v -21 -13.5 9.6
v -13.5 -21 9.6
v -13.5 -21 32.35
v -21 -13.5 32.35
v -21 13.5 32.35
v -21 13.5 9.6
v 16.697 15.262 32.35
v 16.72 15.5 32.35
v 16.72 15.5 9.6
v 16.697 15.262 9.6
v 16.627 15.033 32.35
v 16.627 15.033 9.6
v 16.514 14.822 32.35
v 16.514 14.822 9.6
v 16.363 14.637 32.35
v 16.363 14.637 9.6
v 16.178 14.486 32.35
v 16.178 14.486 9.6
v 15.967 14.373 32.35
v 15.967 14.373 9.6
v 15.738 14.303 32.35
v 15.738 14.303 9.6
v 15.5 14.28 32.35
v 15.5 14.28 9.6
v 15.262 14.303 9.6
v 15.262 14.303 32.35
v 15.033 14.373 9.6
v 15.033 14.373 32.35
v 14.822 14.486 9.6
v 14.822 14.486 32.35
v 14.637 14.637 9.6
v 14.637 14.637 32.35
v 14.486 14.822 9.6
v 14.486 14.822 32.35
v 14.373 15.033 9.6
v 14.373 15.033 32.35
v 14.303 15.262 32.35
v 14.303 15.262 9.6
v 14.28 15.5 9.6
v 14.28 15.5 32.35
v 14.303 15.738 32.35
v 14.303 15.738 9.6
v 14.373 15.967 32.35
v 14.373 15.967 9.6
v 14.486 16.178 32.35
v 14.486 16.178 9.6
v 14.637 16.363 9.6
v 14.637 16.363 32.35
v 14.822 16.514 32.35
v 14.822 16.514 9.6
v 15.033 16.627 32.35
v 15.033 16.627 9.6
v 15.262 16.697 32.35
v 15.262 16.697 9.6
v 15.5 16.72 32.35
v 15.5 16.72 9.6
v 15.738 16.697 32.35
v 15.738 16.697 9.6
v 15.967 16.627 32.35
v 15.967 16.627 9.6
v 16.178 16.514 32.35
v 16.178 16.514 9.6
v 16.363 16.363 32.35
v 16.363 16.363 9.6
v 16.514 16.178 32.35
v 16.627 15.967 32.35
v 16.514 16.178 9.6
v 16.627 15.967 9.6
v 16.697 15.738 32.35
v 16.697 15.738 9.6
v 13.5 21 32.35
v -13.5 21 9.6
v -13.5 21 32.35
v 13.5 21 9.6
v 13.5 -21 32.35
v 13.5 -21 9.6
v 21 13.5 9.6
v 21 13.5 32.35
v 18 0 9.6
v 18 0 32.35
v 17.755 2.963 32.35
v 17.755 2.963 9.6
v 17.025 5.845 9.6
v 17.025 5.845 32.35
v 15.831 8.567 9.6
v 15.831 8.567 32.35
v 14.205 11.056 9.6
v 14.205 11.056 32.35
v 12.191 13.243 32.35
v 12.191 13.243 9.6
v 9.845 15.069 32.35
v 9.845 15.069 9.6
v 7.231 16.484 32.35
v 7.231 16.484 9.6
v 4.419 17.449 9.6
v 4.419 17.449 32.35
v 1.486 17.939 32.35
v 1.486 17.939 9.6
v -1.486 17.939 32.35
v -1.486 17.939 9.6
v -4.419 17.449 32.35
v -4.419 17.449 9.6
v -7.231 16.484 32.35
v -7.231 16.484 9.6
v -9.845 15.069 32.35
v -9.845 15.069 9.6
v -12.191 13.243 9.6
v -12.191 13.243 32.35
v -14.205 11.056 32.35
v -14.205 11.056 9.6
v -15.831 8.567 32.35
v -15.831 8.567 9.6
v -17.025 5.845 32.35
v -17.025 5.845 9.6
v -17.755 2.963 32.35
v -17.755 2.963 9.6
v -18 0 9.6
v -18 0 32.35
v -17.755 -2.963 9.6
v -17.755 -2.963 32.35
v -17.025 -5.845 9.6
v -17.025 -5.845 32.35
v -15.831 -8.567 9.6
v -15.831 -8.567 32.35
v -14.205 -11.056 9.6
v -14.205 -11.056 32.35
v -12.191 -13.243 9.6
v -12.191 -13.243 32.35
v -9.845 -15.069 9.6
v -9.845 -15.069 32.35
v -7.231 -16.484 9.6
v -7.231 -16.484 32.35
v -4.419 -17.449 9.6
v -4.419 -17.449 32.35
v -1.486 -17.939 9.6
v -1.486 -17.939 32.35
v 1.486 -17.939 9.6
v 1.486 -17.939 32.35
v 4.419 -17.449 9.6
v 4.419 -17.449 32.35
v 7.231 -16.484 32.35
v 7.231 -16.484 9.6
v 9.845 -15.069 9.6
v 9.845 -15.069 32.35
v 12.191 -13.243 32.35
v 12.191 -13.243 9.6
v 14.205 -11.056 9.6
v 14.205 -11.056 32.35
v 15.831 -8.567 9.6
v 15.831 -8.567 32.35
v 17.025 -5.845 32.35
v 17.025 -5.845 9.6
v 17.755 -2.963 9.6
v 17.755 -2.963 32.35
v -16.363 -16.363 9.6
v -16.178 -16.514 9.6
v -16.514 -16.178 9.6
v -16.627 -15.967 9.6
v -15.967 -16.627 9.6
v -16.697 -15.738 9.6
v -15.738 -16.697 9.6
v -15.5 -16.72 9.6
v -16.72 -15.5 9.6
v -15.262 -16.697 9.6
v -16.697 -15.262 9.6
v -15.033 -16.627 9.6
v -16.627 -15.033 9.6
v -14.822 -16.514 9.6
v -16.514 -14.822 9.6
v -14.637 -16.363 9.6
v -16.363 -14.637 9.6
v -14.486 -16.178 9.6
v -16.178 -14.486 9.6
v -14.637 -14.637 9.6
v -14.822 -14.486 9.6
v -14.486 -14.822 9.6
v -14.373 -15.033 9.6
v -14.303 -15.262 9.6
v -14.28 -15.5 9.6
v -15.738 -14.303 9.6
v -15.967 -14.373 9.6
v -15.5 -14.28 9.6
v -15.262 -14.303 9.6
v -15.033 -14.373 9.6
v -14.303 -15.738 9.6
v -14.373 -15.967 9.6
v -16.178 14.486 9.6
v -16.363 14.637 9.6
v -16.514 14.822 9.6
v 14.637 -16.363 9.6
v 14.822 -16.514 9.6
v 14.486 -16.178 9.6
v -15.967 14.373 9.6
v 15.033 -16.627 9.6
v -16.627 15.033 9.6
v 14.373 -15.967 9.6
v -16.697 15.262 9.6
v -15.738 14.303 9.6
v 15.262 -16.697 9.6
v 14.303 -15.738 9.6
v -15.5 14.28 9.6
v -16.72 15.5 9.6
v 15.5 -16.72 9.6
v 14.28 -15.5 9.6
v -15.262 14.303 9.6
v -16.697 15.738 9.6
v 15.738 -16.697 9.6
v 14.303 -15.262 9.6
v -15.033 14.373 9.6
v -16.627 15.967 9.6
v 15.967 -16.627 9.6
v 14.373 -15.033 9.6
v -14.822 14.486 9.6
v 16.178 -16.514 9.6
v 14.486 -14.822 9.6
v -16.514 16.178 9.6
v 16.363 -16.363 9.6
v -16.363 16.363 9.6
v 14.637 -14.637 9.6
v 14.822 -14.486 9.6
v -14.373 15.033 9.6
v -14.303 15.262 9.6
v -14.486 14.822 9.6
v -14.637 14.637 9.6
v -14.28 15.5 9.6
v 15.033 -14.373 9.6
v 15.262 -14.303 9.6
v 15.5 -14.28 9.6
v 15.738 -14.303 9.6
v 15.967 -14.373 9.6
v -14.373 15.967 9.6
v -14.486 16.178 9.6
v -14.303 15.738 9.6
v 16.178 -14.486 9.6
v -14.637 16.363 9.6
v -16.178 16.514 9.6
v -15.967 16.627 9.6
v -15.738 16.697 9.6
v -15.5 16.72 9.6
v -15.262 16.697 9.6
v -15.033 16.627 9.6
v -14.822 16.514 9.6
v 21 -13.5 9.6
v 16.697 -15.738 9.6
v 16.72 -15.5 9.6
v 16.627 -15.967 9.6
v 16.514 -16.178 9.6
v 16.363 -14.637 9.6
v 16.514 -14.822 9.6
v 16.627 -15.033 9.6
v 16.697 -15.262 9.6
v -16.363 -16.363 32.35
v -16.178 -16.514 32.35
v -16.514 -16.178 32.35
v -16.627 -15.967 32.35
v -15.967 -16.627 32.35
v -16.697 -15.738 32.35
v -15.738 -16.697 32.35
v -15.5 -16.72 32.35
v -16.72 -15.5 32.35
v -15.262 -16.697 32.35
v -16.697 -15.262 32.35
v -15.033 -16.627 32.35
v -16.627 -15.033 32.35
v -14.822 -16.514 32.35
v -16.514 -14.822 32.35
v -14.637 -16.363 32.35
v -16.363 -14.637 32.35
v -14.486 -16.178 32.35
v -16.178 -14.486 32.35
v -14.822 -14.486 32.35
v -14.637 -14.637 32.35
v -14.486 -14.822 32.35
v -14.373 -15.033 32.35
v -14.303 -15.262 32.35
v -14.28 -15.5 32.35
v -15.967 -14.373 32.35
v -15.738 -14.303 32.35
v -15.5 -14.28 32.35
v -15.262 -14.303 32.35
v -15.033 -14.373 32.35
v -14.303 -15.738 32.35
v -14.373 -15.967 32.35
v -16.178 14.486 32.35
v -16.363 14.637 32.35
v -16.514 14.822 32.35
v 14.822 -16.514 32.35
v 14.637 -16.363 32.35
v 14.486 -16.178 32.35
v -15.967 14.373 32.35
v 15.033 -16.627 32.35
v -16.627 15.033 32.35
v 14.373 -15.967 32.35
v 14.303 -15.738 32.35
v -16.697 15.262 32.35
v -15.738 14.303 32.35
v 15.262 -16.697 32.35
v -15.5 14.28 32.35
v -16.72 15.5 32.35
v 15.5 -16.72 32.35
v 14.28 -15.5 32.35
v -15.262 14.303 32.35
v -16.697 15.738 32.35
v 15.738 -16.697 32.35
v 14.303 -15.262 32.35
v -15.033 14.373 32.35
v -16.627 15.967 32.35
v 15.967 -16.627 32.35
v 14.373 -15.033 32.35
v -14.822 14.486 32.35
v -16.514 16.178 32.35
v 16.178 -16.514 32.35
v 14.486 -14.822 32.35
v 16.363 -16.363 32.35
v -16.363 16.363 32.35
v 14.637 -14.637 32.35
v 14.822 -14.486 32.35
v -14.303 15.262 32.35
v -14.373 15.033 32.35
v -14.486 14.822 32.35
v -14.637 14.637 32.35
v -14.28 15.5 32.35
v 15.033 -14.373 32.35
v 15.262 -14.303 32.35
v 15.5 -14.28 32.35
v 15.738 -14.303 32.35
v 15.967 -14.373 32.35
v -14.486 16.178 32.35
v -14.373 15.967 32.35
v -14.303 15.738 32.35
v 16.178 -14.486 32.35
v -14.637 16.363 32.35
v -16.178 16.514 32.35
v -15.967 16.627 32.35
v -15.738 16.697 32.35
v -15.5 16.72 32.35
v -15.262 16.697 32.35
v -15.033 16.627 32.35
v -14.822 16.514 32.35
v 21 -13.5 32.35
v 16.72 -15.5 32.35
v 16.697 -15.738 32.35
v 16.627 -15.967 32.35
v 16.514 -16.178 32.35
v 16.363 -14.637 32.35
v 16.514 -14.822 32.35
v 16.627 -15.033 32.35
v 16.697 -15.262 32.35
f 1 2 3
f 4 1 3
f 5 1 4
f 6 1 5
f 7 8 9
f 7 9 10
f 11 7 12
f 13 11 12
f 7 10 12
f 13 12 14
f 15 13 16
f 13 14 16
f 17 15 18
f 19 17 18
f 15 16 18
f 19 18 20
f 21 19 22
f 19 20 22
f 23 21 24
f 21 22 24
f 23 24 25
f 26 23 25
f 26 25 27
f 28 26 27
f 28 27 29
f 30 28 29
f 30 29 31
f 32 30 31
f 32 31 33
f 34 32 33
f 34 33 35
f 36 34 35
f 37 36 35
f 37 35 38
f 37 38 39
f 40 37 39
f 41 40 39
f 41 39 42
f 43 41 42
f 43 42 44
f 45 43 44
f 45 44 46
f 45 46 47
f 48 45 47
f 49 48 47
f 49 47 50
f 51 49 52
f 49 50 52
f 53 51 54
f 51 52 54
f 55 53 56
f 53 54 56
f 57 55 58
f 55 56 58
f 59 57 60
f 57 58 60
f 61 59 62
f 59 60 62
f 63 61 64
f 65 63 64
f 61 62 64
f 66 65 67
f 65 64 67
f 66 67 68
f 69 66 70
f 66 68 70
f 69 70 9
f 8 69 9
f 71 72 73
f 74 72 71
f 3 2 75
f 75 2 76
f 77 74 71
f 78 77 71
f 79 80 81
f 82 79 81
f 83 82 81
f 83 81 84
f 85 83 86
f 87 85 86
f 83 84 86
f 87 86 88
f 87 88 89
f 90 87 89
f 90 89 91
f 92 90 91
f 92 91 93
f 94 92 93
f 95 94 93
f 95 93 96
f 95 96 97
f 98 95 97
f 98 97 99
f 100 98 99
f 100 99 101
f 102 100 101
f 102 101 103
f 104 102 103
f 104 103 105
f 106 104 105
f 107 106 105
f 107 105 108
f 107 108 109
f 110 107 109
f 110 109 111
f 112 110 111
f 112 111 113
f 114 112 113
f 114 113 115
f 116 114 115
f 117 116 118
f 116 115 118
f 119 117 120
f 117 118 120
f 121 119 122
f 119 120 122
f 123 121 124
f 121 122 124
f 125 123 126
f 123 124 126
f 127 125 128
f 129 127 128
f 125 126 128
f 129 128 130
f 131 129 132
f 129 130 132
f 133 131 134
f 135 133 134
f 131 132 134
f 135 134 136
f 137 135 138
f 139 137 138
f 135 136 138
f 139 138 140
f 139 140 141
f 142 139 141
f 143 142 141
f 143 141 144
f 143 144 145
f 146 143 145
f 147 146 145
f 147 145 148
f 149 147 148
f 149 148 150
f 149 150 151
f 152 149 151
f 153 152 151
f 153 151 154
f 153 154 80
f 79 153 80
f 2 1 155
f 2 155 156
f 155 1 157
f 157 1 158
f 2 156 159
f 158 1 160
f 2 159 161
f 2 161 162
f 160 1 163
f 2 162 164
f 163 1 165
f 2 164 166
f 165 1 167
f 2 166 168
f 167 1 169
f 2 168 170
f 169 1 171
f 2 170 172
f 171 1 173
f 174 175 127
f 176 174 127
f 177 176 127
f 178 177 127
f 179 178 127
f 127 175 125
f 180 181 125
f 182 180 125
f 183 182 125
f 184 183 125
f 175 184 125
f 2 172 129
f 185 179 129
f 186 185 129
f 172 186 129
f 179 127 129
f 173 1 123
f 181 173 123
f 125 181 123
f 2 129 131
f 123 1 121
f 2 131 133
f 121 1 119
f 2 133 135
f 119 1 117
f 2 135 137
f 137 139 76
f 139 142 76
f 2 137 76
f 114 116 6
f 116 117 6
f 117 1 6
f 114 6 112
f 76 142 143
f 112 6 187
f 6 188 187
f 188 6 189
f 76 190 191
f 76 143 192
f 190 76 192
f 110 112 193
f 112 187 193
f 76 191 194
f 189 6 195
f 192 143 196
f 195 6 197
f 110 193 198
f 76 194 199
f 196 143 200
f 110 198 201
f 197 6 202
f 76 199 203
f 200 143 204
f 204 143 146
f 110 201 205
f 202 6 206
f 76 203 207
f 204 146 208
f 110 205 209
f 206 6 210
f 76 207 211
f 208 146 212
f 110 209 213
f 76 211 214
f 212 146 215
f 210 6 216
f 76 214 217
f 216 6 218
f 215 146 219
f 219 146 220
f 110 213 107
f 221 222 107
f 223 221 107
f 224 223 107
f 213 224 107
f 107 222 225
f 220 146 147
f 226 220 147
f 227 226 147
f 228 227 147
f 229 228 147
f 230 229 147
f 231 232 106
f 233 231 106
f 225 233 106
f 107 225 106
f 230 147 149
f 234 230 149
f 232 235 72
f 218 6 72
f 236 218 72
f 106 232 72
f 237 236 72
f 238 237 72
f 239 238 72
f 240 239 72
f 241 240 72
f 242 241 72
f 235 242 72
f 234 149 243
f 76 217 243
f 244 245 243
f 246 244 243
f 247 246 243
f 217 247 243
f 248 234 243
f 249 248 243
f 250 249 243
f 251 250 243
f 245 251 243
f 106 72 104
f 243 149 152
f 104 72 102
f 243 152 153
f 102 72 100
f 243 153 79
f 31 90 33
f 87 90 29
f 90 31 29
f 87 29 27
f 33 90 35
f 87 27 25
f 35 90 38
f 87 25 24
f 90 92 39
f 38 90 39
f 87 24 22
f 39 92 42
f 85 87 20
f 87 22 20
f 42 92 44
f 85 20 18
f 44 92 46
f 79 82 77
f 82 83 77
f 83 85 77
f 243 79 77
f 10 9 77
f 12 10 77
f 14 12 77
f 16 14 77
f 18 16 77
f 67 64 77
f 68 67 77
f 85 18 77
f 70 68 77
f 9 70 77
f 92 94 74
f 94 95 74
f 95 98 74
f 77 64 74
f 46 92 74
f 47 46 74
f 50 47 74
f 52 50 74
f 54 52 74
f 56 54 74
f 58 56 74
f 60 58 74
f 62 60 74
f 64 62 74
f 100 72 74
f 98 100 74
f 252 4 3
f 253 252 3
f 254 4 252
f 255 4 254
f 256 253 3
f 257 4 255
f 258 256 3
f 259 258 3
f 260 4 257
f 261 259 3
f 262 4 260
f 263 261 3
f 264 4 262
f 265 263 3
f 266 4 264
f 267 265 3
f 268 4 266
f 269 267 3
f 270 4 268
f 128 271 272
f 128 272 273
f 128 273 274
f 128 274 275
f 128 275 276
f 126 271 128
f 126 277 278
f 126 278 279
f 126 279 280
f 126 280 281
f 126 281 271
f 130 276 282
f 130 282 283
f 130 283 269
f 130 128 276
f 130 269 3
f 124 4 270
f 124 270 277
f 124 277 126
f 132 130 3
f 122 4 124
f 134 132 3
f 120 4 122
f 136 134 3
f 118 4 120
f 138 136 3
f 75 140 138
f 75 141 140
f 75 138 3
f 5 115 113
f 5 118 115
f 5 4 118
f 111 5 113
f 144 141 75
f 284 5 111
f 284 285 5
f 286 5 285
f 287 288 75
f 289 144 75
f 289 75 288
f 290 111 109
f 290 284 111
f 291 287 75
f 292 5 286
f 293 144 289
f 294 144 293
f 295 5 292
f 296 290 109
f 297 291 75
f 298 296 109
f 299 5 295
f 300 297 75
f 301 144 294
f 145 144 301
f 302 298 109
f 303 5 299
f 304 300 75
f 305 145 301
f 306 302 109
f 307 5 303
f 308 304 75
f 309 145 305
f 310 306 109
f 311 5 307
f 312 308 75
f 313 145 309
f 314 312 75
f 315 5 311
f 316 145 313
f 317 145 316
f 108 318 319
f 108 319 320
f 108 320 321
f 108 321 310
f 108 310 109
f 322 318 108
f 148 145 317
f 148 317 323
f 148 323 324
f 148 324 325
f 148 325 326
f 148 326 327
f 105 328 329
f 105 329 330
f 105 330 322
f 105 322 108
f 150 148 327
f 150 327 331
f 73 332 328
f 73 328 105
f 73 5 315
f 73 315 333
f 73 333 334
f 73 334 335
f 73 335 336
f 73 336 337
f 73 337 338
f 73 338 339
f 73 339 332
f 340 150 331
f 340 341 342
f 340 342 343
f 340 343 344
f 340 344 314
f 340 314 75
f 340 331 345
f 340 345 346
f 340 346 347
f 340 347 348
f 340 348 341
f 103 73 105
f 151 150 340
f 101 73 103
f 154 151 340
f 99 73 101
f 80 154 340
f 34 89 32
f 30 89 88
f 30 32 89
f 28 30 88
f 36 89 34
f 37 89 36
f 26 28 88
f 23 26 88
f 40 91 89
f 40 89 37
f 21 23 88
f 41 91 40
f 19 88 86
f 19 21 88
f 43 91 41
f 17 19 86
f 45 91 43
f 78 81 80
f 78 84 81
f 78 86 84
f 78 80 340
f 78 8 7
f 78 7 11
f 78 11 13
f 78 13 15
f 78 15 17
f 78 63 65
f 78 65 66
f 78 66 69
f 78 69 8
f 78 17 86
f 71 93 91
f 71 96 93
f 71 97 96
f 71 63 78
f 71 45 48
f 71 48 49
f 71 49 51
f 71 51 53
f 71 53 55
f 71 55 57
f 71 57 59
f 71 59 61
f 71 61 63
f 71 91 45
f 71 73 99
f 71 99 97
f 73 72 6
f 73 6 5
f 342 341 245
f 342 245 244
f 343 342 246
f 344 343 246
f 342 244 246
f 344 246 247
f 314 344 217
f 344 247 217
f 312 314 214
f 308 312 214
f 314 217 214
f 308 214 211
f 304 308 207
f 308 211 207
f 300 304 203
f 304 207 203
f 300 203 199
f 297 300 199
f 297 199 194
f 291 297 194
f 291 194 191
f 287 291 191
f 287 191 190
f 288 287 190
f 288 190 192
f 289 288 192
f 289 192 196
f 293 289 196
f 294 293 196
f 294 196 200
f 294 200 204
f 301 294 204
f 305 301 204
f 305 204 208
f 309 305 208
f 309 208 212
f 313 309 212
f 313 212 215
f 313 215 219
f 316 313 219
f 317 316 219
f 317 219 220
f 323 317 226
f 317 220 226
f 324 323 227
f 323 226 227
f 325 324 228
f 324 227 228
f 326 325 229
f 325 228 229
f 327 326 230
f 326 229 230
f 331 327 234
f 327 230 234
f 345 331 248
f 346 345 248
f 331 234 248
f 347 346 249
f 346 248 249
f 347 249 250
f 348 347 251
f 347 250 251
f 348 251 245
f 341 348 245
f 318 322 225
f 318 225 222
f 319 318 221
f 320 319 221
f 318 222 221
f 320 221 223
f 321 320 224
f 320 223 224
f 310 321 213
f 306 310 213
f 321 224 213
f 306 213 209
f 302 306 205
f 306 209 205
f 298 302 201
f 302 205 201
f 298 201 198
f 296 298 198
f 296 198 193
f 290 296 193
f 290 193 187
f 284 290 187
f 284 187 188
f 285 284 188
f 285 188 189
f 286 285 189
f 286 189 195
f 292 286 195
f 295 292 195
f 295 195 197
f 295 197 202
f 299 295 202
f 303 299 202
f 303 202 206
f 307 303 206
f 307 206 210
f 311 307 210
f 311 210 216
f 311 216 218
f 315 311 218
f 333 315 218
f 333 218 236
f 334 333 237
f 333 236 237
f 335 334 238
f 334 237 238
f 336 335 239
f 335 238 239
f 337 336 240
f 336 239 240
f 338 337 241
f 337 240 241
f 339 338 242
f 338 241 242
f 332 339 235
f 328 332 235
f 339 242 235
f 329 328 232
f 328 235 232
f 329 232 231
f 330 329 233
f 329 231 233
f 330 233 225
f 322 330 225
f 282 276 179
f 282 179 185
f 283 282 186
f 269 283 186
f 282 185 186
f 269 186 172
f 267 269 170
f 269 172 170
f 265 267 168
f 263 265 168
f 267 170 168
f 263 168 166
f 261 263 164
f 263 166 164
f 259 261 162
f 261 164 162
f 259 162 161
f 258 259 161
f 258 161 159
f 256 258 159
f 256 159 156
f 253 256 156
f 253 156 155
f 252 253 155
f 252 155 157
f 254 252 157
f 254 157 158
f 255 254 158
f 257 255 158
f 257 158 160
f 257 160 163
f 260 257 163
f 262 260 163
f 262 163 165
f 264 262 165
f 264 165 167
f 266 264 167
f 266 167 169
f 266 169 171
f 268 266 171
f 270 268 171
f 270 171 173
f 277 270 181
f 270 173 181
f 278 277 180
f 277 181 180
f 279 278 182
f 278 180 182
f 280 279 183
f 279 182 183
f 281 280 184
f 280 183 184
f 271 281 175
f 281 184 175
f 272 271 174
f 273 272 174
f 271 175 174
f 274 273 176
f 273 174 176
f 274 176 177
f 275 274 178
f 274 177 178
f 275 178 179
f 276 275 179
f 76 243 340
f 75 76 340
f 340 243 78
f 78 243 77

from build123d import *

# Parameters (mm, degrees)
SKETCH005_W     = 42
SKETCH005_H     = 42
PAD004_DEPTH    = 22.75
CHAMFER001_SIZE = 7.5
SKETCH008_R     = 1.22
POCKET001_DEPTH = 22.751
SKETCH012_R     = 18
POCKET006_DEPTH = 22.751


with BuildPart() as part:
    # Sketch005 → Pad004 (new body)
    with BuildSketch(Plane.XY):
        Rectangle(SKETCH005_W, SKETCH005_H)
    extrude(amount=PAD004_DEPTH)

    # Chamfer001
    chamfer001_edges = [part.edges().sort_by_distance(p)[0] for p in [
        (-21, -21, 11.375),
        (-21, 21, 11.375),
        (21, -21, 11.375),
        (21, 21, 11.375),
    ]]
    chamfer(chamfer001_edges, length=CHAMFER001_SIZE)

    # Sketch008 (on Face2 of Chamfer001) → Pocket001 (cut, through all)
    with BuildSketch(Plane(origin=(0, 0, 0), x_dir=(1, 0, 0), z_dir=(0, 0, -1))):
        with Locations((-15.5, 15.5)):
            Circle(SKETCH008_R)
        with Locations((15.5, 15.5)):
            Circle(SKETCH008_R)
        with Locations((15.5, -15.5)):
            Circle(SKETCH008_R)
        with Locations((-15.5, -15.5)):
            Circle(SKETCH008_R)
    extrude(amount=-POCKET001_DEPTH, mode=Mode.SUBTRACT)

    # Sketch012 (on Face5 of Pocket001) → Pocket006 (cut, through all)
    with BuildSketch(Plane.XY.offset(22.75)):
        Circle(SKETCH012_R)
    extrude(amount=-POCKET006_DEPTH, mode=Mode.SUBTRACT)


with BuildPart() as part_1:
    # Body003 placement: moved
    add(part.part.moved(Location((0, 0, 9.6))))


solid = part_1.part
